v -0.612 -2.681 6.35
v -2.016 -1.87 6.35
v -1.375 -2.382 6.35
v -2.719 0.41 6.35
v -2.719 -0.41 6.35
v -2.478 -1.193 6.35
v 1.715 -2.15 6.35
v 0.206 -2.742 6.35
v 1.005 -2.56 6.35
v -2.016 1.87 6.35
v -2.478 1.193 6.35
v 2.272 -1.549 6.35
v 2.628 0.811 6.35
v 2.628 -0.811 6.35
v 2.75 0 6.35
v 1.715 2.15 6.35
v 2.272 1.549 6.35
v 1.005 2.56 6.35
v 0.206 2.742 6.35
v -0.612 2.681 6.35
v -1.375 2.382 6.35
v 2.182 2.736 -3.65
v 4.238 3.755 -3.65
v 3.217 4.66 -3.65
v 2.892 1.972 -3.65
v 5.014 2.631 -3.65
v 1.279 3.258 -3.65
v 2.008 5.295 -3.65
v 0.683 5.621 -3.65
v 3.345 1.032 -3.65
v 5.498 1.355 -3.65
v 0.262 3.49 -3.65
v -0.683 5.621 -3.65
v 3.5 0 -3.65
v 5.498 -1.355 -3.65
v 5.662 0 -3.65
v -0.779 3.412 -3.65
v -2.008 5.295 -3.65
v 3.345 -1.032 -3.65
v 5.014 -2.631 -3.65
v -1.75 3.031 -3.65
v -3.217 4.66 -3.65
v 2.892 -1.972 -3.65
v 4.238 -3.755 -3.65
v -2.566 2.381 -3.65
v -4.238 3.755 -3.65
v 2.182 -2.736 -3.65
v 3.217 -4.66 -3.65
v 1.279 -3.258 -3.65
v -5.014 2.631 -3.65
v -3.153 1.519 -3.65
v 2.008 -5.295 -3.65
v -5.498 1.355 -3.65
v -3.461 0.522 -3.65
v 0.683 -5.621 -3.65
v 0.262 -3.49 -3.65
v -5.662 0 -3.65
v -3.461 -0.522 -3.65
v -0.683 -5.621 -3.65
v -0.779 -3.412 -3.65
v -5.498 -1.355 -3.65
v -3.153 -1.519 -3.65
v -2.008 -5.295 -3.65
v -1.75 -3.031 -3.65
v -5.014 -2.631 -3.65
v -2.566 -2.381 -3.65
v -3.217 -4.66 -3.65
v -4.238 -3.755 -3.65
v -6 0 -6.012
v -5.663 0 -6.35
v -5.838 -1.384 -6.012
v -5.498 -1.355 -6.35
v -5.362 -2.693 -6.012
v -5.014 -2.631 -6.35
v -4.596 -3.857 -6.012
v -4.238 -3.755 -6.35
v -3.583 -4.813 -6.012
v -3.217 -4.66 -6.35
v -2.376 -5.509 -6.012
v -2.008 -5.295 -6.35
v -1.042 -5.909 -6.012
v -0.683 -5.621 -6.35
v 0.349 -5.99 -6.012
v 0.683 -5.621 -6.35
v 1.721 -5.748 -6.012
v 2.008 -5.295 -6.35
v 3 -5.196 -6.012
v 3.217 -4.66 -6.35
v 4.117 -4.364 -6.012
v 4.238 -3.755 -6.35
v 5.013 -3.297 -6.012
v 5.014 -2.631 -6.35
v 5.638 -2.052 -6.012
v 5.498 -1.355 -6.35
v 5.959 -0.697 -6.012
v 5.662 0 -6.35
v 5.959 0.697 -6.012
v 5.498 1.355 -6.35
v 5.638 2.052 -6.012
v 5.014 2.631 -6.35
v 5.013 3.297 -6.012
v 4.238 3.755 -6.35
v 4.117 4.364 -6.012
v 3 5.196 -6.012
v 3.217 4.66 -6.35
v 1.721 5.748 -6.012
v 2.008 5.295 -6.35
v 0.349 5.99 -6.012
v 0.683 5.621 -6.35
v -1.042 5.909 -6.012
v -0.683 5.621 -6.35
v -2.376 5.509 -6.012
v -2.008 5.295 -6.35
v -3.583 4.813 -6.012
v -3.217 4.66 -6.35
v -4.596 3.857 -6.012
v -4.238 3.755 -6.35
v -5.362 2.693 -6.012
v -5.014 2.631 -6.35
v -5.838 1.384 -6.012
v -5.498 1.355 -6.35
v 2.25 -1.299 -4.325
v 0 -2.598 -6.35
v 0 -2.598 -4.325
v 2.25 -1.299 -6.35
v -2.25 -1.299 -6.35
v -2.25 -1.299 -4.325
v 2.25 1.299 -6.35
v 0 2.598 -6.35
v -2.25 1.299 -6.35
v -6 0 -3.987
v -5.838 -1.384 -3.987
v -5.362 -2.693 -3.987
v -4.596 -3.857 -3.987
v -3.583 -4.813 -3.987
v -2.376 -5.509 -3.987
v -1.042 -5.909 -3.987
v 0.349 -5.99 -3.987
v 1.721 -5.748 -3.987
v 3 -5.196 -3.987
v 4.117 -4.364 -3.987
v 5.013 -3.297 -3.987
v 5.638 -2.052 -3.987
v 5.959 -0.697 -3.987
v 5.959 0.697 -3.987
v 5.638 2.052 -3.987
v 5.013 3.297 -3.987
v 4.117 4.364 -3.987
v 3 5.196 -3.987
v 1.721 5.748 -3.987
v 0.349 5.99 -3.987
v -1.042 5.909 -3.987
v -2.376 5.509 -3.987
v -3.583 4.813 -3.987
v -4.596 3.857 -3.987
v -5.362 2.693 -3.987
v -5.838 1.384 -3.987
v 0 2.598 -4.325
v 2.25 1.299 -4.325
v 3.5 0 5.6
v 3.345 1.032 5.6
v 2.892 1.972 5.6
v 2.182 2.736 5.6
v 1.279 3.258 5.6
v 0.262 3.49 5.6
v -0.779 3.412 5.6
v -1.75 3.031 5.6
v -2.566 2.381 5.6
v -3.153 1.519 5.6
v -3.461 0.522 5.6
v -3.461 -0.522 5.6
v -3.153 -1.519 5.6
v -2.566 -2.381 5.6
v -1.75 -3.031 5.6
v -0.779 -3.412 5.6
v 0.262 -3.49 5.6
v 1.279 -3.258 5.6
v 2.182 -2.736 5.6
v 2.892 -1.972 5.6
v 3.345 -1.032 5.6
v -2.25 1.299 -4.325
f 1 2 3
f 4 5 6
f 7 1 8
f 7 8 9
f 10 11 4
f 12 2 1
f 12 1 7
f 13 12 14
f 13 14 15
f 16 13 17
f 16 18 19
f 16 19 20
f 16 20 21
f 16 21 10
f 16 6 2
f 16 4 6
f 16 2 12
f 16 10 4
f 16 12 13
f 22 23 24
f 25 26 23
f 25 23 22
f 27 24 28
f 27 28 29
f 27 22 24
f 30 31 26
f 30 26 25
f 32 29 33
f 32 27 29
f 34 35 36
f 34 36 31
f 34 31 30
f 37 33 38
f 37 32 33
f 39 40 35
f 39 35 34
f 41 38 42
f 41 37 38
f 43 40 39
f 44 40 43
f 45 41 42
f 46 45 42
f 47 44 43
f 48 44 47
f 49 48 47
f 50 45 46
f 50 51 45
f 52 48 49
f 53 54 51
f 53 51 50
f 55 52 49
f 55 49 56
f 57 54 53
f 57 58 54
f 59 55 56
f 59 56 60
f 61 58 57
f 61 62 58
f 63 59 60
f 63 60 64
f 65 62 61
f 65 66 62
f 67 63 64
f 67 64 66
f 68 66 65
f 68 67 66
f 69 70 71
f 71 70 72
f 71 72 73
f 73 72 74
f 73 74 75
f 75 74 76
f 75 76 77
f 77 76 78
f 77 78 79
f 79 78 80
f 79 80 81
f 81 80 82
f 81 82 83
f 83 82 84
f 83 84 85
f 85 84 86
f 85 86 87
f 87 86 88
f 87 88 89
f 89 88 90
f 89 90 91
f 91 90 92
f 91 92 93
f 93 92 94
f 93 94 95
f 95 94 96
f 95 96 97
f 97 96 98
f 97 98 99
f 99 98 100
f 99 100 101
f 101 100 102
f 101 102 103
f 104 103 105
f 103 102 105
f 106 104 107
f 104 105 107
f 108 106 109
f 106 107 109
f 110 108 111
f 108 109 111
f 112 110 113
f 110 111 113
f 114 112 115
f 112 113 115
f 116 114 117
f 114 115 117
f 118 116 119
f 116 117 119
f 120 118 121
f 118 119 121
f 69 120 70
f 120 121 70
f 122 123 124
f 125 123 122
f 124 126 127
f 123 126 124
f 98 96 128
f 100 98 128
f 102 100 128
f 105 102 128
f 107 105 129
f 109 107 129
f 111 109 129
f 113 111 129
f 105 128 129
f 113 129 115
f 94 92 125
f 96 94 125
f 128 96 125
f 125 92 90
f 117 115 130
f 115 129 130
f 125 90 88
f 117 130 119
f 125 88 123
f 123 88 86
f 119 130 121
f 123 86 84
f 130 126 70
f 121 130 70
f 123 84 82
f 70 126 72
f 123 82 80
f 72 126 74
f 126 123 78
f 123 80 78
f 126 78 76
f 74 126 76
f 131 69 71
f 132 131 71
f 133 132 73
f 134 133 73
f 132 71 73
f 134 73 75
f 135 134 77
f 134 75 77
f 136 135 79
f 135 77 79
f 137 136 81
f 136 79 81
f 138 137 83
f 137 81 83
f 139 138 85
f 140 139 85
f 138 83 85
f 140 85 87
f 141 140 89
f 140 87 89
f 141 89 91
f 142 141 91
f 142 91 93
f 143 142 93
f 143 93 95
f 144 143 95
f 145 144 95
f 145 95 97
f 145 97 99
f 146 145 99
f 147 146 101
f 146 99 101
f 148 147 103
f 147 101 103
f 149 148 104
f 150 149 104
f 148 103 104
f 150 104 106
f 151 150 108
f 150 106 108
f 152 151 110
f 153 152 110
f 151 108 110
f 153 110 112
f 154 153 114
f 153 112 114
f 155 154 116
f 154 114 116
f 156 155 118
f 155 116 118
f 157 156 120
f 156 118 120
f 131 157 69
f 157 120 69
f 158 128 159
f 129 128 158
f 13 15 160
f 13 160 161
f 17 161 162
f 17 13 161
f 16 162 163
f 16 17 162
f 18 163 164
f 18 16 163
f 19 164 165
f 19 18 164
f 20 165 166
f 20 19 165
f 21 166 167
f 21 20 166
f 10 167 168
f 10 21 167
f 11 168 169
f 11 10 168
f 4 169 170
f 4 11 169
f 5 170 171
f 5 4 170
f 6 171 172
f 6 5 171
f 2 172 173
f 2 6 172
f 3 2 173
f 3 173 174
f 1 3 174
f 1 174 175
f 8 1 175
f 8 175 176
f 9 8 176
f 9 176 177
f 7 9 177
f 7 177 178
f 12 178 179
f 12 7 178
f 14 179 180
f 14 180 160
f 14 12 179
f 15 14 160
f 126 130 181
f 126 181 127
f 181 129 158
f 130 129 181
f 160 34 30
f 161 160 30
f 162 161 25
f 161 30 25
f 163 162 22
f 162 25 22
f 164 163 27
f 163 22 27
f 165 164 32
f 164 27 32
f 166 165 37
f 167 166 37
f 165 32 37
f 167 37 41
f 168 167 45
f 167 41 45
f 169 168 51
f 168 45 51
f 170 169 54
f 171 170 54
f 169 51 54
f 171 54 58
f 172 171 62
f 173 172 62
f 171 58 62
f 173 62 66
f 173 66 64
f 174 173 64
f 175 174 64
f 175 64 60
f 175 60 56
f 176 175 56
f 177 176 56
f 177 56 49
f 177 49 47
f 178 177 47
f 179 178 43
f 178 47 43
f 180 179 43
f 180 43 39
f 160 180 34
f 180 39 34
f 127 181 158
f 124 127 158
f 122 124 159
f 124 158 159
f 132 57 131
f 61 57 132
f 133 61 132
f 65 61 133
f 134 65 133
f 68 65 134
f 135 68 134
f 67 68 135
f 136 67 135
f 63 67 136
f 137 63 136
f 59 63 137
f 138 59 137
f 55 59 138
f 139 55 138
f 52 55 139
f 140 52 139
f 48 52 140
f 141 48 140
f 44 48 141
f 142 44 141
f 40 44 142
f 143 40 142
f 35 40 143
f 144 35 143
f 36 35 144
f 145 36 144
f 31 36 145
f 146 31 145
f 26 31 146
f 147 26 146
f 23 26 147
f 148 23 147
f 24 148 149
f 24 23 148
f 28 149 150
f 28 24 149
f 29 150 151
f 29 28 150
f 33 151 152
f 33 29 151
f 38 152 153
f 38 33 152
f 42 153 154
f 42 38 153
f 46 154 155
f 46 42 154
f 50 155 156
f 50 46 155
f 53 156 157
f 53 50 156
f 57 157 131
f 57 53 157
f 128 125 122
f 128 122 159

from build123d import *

# Parameters (mm, degrees)
EXTRUDE1_START     = -3.65
SKETCH1_R          = 3.5
EXTRUDE1_DEPTH     = 10
EXTRUDE2_START     = -6.35
SKETCH6_R          = 6
EXTRUDE2_DEPTH     = 2.7
CUT_EXTRUDE1_DEPTH = 2.025
CHAMFER1_SIZE      = 0.3375
CHAMFER2_SIZE      = 0.75


with BuildPart() as part:
    # Sketch1 → Extrude1 (new body)
    with BuildSketch(Plane.XY.offset(EXTRUDE1_START)):
        Circle(SKETCH1_R)
    extrude(amount=EXTRUDE1_DEPTH)

    # Sketch6 → Extrude2 (add)
    with BuildSketch(Plane.XY.offset(EXTRUDE2_START)):
        with Locations(Location((0, 0, 0), (0, 0, 180))):
            Circle(SKETCH6_R)
    extrude(amount=EXTRUDE2_DEPTH)

    # Sketch7 → Cut-Extrude1 (cut)
    with BuildSketch(Plane.XY.offset(-6.35)):
        Polygon((0, 2.598076211), (-2.25, 1.299038106), (-2.25, -1.299038106), (0, -2.598076211), (2.25, -1.299038106), (2.25, 1.299038106), align=None)
    extrude(amount=CUT_EXTRUDE1_DEPTH, mode=Mode.SUBTRACT)

    # Chamfer1
    chamfer1_edges = [part.edges().sort_by_distance(p)[0] for p in [
        (6, 0, -3.65),
        (6, 0, -6.35),
    ]]
    chamfer(chamfer1_edges, length=CHAMFER1_SIZE)

    # Chamfer2
    chamfer2_edges = [part.edges().sort_by_distance(p)[0] for p in [
        (-3.5, 0, 6.35),
    ]]
    chamfer(chamfer2_edges, length=CHAMFER2_SIZE)


solid = part.part
